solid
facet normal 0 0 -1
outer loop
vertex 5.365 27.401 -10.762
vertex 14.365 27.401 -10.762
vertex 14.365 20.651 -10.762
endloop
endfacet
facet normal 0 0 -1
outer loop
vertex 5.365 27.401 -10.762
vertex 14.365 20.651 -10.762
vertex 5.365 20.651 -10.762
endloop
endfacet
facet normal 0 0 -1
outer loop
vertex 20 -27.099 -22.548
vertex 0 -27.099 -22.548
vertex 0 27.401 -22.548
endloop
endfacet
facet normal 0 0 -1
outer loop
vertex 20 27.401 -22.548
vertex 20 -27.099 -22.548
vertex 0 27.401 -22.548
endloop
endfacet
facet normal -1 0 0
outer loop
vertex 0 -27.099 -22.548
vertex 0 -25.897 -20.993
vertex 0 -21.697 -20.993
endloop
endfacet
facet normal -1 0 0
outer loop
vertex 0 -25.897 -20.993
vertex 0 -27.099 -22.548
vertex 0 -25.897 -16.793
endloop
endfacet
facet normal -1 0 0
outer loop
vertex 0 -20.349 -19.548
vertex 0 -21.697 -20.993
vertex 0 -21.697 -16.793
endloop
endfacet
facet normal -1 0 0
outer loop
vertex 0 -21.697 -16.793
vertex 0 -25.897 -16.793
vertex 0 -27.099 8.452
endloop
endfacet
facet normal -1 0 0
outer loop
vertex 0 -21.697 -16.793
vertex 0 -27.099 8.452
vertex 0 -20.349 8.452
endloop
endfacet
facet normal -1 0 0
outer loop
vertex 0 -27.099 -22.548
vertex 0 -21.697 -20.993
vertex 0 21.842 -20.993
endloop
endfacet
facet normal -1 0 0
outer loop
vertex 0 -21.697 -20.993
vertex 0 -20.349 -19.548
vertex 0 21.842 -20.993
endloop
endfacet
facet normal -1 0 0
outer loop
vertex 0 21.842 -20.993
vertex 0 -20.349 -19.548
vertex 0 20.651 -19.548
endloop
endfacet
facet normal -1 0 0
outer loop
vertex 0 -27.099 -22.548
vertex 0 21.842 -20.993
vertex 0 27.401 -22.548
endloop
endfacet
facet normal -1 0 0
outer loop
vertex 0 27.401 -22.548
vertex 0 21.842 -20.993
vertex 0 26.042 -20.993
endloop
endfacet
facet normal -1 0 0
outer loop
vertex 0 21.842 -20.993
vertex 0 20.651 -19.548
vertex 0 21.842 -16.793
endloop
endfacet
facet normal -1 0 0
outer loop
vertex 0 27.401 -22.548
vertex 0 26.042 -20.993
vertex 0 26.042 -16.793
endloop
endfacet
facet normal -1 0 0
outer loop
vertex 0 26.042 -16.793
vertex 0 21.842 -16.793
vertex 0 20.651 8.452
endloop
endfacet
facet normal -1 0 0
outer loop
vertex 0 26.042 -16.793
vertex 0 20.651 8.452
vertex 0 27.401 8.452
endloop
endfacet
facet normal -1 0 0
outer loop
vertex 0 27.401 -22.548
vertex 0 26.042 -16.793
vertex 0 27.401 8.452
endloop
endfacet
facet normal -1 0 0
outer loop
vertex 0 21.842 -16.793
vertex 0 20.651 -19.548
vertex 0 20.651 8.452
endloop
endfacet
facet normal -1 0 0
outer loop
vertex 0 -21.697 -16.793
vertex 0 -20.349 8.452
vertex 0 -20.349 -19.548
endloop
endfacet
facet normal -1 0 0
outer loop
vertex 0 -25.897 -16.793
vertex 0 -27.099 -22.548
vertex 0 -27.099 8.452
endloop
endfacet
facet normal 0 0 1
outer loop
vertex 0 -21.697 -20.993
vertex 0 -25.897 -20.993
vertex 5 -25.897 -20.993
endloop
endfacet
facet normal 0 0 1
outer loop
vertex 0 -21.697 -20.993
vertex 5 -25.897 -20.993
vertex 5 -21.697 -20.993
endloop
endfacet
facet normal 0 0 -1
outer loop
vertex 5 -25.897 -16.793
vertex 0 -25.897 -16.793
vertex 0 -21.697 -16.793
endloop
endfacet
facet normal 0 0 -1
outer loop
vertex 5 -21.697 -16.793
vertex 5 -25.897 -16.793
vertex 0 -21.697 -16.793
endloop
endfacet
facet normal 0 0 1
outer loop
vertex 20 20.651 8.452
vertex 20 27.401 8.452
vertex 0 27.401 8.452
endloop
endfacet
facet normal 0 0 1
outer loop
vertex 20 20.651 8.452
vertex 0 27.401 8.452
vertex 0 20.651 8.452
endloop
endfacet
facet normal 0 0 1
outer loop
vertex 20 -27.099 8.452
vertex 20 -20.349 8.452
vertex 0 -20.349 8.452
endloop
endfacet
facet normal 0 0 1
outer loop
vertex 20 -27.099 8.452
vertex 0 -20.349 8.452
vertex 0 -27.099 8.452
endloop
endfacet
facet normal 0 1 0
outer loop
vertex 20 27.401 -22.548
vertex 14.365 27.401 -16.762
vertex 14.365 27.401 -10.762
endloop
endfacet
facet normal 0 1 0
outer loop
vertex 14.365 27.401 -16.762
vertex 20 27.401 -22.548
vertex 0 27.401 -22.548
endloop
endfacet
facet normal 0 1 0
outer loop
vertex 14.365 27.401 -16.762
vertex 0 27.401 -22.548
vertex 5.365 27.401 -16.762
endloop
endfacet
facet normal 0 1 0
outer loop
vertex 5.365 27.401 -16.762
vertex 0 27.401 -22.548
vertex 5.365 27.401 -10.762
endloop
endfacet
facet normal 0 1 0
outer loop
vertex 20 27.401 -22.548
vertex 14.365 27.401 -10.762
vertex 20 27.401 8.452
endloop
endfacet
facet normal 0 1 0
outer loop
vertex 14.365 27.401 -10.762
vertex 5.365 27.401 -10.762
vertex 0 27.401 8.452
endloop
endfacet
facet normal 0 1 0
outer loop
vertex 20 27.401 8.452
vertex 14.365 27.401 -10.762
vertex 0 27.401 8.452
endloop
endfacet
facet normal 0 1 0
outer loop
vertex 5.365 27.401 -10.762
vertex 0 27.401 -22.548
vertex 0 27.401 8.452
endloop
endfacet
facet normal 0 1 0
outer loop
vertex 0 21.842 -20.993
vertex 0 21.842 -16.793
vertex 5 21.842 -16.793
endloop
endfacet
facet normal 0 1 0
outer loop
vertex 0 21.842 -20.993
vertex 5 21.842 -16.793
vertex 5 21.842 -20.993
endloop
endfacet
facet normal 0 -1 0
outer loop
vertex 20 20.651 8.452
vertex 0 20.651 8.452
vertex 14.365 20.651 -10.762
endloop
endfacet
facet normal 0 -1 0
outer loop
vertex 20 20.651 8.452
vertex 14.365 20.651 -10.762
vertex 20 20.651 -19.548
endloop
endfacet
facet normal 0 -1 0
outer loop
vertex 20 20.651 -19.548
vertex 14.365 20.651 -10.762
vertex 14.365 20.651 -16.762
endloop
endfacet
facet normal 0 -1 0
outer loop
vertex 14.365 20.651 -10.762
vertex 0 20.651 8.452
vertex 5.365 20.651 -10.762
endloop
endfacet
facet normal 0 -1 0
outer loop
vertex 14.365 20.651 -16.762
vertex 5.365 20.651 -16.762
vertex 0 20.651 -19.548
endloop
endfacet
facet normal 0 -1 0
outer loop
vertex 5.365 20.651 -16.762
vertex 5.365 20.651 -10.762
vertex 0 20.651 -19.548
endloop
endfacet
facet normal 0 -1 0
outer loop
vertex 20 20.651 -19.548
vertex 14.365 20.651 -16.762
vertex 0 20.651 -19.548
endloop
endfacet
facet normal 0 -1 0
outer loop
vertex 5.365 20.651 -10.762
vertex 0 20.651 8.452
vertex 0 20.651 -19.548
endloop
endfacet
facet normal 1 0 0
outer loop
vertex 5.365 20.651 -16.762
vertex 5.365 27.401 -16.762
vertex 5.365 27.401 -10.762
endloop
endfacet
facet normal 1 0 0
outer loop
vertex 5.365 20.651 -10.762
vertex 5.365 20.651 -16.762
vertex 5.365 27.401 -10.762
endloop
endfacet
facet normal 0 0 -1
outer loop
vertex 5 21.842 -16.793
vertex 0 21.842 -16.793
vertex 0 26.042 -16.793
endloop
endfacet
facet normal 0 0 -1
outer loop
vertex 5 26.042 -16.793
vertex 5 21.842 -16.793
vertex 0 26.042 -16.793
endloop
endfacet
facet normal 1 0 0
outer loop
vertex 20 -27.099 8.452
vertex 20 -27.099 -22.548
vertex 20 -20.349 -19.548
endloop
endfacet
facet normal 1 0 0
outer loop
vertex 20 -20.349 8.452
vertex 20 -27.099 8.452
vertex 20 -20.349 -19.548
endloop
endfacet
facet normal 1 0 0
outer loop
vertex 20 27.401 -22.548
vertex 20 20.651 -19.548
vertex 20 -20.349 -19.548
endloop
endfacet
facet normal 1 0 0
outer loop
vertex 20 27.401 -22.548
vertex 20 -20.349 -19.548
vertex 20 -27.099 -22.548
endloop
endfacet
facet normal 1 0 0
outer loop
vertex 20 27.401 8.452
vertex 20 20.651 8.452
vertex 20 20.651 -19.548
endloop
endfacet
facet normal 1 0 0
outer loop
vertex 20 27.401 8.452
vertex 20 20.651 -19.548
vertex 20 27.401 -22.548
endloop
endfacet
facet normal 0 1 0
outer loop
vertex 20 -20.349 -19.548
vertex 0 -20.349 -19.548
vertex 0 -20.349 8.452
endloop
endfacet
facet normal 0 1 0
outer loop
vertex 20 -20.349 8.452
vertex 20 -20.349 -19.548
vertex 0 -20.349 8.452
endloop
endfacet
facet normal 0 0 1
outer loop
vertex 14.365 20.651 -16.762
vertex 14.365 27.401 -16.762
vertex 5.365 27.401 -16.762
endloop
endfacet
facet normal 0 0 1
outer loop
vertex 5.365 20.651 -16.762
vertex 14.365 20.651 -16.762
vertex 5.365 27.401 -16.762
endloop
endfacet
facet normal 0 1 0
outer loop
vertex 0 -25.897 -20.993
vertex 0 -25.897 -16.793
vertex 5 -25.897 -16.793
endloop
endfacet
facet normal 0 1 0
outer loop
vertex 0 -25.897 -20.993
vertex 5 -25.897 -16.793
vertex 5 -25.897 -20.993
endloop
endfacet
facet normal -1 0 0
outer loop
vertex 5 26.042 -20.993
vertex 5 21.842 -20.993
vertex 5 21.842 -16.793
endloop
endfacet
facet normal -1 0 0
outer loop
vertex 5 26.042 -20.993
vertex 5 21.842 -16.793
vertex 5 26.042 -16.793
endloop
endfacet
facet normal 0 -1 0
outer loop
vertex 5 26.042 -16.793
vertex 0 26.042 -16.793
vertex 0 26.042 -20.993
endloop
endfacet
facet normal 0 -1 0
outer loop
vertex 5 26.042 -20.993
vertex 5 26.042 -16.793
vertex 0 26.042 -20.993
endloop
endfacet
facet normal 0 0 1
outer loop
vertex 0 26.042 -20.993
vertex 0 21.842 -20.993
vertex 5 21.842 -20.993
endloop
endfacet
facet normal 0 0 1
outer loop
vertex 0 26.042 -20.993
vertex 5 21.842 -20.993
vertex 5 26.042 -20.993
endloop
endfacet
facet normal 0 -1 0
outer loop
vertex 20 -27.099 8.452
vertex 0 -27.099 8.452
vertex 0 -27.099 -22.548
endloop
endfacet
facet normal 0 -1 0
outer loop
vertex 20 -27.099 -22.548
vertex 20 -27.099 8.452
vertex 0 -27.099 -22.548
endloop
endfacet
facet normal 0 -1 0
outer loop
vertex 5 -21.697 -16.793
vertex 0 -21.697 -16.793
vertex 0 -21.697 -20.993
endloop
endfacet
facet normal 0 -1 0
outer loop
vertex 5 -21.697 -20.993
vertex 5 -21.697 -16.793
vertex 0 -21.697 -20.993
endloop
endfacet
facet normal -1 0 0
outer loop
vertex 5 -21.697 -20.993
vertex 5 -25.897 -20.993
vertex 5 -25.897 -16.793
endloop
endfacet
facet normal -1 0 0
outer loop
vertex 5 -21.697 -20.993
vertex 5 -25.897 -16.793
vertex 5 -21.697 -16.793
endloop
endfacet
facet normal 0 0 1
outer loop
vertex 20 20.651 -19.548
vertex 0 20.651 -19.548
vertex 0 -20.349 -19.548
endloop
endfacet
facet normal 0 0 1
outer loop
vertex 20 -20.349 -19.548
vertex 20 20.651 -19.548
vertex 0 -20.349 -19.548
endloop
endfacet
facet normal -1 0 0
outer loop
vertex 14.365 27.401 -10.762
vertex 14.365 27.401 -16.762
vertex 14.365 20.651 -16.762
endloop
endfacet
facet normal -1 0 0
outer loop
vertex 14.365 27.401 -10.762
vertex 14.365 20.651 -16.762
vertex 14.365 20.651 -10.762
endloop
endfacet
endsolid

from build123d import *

# Parameters (mm, degrees)
PAD_DEPTH       = 20
SKETCH001_W     = 9
SKETCH001_H     = 6
POCKET_DEPTH    = 8
SKETCH002_W     = 4.2
SKETCH002_H     = 4.2
POCKET001_DEPTH = 5


with BuildPart() as part:
    # Sketch → Pad (new body)
    with BuildSketch(Plane.YZ):
        Polygon((-27.098937, -22.548221), (27.401063, -22.548221), (27.401063, 8.451779), (20.651063, 8.451779), (20.651063, -19.548221), (-20.348937, -19.548221), (-20.348937, 8.451779), (-27.098937, 8.451779), align=None)
    extrude(amount=PAD_DEPTH)

    # Sketch001 → Pocket (cut)
    with BuildSketch(Plane(origin=(0, 27.401063, 0), x_dir=(-1, 0, 0), z_dir=(0, 1, 0))):
        with Locations((-9.865053, -13.762334)):
            Rectangle(SKETCH001_W, SKETCH001_H)
    extrude(amount=-POCKET_DEPTH, mode=Mode.SUBTRACT)

    # Sketch002 (on Face4 of Pocket) → Pocket001 (cut)
    with BuildSketch(Plane(origin=(0, 0, 0), x_dir=(0, 1, 0), z_dir=(-1, 0, 0))):
        with Locations((-23.796906, 18.893097)):
            Rectangle(SKETCH002_W, SKETCH002_H)
        with Locations((23.941537, 18.893097)):
            Rectangle(SKETCH002_W, SKETCH002_H)
    extrude(amount=-POCKET001_DEPTH, mode=Mode.SUBTRACT)


solid = part.part
